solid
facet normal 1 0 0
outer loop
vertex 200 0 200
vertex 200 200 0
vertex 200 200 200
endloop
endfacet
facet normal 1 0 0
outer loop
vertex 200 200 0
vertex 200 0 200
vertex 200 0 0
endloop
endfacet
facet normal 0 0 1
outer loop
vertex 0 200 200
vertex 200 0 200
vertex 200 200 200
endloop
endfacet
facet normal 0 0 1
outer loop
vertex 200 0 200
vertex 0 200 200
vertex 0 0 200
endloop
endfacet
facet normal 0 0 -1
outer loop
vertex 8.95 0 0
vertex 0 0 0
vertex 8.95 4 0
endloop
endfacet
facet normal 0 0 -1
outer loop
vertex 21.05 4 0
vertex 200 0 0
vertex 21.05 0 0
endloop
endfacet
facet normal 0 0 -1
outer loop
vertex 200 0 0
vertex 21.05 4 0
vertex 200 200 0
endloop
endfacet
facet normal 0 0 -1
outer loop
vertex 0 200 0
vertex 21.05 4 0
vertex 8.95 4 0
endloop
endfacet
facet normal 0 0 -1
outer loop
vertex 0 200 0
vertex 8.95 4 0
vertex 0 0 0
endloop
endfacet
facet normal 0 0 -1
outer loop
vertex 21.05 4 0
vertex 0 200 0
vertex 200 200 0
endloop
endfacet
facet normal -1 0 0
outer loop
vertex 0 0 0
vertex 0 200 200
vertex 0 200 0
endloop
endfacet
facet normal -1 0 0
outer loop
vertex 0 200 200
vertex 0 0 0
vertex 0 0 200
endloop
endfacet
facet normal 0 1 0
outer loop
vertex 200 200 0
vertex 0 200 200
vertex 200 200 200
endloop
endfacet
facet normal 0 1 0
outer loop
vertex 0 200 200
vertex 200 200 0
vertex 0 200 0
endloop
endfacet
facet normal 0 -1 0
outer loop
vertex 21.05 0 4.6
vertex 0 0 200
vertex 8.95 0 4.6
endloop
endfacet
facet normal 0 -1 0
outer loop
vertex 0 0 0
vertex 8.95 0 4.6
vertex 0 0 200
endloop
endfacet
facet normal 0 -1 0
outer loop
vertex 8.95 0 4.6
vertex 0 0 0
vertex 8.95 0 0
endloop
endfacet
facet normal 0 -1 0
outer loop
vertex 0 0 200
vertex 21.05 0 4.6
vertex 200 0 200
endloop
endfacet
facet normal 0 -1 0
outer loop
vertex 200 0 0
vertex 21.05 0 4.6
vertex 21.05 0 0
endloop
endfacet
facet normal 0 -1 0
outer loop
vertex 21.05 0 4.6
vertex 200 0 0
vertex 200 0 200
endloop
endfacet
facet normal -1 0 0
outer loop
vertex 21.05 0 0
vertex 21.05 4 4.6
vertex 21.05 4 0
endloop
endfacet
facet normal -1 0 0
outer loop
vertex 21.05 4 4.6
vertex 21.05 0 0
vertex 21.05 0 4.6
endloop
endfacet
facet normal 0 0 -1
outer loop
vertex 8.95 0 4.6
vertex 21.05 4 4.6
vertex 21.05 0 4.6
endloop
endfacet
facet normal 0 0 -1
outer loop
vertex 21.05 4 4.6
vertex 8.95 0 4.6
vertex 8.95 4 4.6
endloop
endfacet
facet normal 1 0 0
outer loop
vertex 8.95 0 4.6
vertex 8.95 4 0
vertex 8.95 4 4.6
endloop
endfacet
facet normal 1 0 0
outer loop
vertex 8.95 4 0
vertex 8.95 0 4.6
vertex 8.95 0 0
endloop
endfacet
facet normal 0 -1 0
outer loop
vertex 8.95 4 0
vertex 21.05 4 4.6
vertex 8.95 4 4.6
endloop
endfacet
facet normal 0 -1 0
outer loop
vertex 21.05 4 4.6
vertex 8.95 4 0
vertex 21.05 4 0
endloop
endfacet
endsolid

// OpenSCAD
pcbWidth = 30;
pcbLength = 77;

$fn=20;

// -----------------------------------------
// -----------------------------------------
module GenericBase(xDistance, yDistance, zHeight) {
	translate([radius,radius,0]) {
		minkowski()
		{
			cube([xDistance-(radius*2), yDistance-(radius*2), (zHeight/2)]);
			cylinder(r=radius,h=(zHeight/2));
		}
	}
}

module MainPcb() {
    
    
    difference() {
        union() {
            cube([pcbWidth, pcbLength, 1.6]);
            
            // Add the LED.
            translate([3, 44.5,1.6]) {
                cube([2, 5, 1.5]);
                translate([1, 2.5, 1.5]) {
                    %cylinder(h=25, r=1);
                }
            }
        }
        union() {
            // Pcb Mount holes...
            
            // Hold under photon
            translate([pcbWidth/2, 14.5, -5]) {
                // NB: Does not actually come through the photon.
                #cylinder(h=30, r=1.5);
            }
            
            // Rear holes
            translate([pcbWidth/2, 72.5, -5]) {                
                
                translate([11.5, 0, 0]) {
                    #cylinder(h=30, r=1.5);
                }
                
                translate([-11.5, 0, 0]) {
                    // NB: Does not actually come through the photon.
                    #cylinder(h=30, r=1.5);
                }
            }
        }
    }
}

module UsbConnector() {
    // 15mm overhang, overall 19mm
    cube([12.1, 19, 4.6]);
}

module Relay() {
    cube([15.3, 19, 15.4]);
}

module PhotonInSocket() {
    cube([20.5, 37, 15.2]);
    
    // Add the LED.
    translate([10.3, 11.5, 3]) {
        %cylinder(h=25, r=1);
    }
    
    // Upper half of a USB plug.
    translate([(20.5/2) - (11.5/2), -18, 15.2]) {
        %cube([11.3, 25, 4.2]);
    }
}

module TerminalBlock() {
    cube([16, 12.0, 8.3]);
    
    translate([0,12.0,0]) {
        // With connector
        //%cube([16, 22, 8.3]);
    
        translate([0,0,0]) {
            %cube([16, 22-11.5, 16]);
        }
    }
}


// -----------------------------------------
// -----------------------------------------
module PcbModel() {
   
    difference() {
        union() {
            //MainPcb();
            cube([200,200,200], round=true);
            
            // move to on top of PCB and in the middle.
            translate([(pcbWidth/2),0, 1.6]) {
                translate([0-(15.3/2),44.5,0]) {
            //        Relay();
                }
                
                translate([0-(20.5/2),2,0]) {
              //      PhotonInSocket();
                }
                
                translate([0-(16/2),71,0]) {
              //      TerminalBlock();
                }
            }
        }
        union() {
            translate([(pcbWidth/2) - (12.1/2),-15, 0]) {
                #UsbConnector();
            }
        }
    }
}

PcbModel();
